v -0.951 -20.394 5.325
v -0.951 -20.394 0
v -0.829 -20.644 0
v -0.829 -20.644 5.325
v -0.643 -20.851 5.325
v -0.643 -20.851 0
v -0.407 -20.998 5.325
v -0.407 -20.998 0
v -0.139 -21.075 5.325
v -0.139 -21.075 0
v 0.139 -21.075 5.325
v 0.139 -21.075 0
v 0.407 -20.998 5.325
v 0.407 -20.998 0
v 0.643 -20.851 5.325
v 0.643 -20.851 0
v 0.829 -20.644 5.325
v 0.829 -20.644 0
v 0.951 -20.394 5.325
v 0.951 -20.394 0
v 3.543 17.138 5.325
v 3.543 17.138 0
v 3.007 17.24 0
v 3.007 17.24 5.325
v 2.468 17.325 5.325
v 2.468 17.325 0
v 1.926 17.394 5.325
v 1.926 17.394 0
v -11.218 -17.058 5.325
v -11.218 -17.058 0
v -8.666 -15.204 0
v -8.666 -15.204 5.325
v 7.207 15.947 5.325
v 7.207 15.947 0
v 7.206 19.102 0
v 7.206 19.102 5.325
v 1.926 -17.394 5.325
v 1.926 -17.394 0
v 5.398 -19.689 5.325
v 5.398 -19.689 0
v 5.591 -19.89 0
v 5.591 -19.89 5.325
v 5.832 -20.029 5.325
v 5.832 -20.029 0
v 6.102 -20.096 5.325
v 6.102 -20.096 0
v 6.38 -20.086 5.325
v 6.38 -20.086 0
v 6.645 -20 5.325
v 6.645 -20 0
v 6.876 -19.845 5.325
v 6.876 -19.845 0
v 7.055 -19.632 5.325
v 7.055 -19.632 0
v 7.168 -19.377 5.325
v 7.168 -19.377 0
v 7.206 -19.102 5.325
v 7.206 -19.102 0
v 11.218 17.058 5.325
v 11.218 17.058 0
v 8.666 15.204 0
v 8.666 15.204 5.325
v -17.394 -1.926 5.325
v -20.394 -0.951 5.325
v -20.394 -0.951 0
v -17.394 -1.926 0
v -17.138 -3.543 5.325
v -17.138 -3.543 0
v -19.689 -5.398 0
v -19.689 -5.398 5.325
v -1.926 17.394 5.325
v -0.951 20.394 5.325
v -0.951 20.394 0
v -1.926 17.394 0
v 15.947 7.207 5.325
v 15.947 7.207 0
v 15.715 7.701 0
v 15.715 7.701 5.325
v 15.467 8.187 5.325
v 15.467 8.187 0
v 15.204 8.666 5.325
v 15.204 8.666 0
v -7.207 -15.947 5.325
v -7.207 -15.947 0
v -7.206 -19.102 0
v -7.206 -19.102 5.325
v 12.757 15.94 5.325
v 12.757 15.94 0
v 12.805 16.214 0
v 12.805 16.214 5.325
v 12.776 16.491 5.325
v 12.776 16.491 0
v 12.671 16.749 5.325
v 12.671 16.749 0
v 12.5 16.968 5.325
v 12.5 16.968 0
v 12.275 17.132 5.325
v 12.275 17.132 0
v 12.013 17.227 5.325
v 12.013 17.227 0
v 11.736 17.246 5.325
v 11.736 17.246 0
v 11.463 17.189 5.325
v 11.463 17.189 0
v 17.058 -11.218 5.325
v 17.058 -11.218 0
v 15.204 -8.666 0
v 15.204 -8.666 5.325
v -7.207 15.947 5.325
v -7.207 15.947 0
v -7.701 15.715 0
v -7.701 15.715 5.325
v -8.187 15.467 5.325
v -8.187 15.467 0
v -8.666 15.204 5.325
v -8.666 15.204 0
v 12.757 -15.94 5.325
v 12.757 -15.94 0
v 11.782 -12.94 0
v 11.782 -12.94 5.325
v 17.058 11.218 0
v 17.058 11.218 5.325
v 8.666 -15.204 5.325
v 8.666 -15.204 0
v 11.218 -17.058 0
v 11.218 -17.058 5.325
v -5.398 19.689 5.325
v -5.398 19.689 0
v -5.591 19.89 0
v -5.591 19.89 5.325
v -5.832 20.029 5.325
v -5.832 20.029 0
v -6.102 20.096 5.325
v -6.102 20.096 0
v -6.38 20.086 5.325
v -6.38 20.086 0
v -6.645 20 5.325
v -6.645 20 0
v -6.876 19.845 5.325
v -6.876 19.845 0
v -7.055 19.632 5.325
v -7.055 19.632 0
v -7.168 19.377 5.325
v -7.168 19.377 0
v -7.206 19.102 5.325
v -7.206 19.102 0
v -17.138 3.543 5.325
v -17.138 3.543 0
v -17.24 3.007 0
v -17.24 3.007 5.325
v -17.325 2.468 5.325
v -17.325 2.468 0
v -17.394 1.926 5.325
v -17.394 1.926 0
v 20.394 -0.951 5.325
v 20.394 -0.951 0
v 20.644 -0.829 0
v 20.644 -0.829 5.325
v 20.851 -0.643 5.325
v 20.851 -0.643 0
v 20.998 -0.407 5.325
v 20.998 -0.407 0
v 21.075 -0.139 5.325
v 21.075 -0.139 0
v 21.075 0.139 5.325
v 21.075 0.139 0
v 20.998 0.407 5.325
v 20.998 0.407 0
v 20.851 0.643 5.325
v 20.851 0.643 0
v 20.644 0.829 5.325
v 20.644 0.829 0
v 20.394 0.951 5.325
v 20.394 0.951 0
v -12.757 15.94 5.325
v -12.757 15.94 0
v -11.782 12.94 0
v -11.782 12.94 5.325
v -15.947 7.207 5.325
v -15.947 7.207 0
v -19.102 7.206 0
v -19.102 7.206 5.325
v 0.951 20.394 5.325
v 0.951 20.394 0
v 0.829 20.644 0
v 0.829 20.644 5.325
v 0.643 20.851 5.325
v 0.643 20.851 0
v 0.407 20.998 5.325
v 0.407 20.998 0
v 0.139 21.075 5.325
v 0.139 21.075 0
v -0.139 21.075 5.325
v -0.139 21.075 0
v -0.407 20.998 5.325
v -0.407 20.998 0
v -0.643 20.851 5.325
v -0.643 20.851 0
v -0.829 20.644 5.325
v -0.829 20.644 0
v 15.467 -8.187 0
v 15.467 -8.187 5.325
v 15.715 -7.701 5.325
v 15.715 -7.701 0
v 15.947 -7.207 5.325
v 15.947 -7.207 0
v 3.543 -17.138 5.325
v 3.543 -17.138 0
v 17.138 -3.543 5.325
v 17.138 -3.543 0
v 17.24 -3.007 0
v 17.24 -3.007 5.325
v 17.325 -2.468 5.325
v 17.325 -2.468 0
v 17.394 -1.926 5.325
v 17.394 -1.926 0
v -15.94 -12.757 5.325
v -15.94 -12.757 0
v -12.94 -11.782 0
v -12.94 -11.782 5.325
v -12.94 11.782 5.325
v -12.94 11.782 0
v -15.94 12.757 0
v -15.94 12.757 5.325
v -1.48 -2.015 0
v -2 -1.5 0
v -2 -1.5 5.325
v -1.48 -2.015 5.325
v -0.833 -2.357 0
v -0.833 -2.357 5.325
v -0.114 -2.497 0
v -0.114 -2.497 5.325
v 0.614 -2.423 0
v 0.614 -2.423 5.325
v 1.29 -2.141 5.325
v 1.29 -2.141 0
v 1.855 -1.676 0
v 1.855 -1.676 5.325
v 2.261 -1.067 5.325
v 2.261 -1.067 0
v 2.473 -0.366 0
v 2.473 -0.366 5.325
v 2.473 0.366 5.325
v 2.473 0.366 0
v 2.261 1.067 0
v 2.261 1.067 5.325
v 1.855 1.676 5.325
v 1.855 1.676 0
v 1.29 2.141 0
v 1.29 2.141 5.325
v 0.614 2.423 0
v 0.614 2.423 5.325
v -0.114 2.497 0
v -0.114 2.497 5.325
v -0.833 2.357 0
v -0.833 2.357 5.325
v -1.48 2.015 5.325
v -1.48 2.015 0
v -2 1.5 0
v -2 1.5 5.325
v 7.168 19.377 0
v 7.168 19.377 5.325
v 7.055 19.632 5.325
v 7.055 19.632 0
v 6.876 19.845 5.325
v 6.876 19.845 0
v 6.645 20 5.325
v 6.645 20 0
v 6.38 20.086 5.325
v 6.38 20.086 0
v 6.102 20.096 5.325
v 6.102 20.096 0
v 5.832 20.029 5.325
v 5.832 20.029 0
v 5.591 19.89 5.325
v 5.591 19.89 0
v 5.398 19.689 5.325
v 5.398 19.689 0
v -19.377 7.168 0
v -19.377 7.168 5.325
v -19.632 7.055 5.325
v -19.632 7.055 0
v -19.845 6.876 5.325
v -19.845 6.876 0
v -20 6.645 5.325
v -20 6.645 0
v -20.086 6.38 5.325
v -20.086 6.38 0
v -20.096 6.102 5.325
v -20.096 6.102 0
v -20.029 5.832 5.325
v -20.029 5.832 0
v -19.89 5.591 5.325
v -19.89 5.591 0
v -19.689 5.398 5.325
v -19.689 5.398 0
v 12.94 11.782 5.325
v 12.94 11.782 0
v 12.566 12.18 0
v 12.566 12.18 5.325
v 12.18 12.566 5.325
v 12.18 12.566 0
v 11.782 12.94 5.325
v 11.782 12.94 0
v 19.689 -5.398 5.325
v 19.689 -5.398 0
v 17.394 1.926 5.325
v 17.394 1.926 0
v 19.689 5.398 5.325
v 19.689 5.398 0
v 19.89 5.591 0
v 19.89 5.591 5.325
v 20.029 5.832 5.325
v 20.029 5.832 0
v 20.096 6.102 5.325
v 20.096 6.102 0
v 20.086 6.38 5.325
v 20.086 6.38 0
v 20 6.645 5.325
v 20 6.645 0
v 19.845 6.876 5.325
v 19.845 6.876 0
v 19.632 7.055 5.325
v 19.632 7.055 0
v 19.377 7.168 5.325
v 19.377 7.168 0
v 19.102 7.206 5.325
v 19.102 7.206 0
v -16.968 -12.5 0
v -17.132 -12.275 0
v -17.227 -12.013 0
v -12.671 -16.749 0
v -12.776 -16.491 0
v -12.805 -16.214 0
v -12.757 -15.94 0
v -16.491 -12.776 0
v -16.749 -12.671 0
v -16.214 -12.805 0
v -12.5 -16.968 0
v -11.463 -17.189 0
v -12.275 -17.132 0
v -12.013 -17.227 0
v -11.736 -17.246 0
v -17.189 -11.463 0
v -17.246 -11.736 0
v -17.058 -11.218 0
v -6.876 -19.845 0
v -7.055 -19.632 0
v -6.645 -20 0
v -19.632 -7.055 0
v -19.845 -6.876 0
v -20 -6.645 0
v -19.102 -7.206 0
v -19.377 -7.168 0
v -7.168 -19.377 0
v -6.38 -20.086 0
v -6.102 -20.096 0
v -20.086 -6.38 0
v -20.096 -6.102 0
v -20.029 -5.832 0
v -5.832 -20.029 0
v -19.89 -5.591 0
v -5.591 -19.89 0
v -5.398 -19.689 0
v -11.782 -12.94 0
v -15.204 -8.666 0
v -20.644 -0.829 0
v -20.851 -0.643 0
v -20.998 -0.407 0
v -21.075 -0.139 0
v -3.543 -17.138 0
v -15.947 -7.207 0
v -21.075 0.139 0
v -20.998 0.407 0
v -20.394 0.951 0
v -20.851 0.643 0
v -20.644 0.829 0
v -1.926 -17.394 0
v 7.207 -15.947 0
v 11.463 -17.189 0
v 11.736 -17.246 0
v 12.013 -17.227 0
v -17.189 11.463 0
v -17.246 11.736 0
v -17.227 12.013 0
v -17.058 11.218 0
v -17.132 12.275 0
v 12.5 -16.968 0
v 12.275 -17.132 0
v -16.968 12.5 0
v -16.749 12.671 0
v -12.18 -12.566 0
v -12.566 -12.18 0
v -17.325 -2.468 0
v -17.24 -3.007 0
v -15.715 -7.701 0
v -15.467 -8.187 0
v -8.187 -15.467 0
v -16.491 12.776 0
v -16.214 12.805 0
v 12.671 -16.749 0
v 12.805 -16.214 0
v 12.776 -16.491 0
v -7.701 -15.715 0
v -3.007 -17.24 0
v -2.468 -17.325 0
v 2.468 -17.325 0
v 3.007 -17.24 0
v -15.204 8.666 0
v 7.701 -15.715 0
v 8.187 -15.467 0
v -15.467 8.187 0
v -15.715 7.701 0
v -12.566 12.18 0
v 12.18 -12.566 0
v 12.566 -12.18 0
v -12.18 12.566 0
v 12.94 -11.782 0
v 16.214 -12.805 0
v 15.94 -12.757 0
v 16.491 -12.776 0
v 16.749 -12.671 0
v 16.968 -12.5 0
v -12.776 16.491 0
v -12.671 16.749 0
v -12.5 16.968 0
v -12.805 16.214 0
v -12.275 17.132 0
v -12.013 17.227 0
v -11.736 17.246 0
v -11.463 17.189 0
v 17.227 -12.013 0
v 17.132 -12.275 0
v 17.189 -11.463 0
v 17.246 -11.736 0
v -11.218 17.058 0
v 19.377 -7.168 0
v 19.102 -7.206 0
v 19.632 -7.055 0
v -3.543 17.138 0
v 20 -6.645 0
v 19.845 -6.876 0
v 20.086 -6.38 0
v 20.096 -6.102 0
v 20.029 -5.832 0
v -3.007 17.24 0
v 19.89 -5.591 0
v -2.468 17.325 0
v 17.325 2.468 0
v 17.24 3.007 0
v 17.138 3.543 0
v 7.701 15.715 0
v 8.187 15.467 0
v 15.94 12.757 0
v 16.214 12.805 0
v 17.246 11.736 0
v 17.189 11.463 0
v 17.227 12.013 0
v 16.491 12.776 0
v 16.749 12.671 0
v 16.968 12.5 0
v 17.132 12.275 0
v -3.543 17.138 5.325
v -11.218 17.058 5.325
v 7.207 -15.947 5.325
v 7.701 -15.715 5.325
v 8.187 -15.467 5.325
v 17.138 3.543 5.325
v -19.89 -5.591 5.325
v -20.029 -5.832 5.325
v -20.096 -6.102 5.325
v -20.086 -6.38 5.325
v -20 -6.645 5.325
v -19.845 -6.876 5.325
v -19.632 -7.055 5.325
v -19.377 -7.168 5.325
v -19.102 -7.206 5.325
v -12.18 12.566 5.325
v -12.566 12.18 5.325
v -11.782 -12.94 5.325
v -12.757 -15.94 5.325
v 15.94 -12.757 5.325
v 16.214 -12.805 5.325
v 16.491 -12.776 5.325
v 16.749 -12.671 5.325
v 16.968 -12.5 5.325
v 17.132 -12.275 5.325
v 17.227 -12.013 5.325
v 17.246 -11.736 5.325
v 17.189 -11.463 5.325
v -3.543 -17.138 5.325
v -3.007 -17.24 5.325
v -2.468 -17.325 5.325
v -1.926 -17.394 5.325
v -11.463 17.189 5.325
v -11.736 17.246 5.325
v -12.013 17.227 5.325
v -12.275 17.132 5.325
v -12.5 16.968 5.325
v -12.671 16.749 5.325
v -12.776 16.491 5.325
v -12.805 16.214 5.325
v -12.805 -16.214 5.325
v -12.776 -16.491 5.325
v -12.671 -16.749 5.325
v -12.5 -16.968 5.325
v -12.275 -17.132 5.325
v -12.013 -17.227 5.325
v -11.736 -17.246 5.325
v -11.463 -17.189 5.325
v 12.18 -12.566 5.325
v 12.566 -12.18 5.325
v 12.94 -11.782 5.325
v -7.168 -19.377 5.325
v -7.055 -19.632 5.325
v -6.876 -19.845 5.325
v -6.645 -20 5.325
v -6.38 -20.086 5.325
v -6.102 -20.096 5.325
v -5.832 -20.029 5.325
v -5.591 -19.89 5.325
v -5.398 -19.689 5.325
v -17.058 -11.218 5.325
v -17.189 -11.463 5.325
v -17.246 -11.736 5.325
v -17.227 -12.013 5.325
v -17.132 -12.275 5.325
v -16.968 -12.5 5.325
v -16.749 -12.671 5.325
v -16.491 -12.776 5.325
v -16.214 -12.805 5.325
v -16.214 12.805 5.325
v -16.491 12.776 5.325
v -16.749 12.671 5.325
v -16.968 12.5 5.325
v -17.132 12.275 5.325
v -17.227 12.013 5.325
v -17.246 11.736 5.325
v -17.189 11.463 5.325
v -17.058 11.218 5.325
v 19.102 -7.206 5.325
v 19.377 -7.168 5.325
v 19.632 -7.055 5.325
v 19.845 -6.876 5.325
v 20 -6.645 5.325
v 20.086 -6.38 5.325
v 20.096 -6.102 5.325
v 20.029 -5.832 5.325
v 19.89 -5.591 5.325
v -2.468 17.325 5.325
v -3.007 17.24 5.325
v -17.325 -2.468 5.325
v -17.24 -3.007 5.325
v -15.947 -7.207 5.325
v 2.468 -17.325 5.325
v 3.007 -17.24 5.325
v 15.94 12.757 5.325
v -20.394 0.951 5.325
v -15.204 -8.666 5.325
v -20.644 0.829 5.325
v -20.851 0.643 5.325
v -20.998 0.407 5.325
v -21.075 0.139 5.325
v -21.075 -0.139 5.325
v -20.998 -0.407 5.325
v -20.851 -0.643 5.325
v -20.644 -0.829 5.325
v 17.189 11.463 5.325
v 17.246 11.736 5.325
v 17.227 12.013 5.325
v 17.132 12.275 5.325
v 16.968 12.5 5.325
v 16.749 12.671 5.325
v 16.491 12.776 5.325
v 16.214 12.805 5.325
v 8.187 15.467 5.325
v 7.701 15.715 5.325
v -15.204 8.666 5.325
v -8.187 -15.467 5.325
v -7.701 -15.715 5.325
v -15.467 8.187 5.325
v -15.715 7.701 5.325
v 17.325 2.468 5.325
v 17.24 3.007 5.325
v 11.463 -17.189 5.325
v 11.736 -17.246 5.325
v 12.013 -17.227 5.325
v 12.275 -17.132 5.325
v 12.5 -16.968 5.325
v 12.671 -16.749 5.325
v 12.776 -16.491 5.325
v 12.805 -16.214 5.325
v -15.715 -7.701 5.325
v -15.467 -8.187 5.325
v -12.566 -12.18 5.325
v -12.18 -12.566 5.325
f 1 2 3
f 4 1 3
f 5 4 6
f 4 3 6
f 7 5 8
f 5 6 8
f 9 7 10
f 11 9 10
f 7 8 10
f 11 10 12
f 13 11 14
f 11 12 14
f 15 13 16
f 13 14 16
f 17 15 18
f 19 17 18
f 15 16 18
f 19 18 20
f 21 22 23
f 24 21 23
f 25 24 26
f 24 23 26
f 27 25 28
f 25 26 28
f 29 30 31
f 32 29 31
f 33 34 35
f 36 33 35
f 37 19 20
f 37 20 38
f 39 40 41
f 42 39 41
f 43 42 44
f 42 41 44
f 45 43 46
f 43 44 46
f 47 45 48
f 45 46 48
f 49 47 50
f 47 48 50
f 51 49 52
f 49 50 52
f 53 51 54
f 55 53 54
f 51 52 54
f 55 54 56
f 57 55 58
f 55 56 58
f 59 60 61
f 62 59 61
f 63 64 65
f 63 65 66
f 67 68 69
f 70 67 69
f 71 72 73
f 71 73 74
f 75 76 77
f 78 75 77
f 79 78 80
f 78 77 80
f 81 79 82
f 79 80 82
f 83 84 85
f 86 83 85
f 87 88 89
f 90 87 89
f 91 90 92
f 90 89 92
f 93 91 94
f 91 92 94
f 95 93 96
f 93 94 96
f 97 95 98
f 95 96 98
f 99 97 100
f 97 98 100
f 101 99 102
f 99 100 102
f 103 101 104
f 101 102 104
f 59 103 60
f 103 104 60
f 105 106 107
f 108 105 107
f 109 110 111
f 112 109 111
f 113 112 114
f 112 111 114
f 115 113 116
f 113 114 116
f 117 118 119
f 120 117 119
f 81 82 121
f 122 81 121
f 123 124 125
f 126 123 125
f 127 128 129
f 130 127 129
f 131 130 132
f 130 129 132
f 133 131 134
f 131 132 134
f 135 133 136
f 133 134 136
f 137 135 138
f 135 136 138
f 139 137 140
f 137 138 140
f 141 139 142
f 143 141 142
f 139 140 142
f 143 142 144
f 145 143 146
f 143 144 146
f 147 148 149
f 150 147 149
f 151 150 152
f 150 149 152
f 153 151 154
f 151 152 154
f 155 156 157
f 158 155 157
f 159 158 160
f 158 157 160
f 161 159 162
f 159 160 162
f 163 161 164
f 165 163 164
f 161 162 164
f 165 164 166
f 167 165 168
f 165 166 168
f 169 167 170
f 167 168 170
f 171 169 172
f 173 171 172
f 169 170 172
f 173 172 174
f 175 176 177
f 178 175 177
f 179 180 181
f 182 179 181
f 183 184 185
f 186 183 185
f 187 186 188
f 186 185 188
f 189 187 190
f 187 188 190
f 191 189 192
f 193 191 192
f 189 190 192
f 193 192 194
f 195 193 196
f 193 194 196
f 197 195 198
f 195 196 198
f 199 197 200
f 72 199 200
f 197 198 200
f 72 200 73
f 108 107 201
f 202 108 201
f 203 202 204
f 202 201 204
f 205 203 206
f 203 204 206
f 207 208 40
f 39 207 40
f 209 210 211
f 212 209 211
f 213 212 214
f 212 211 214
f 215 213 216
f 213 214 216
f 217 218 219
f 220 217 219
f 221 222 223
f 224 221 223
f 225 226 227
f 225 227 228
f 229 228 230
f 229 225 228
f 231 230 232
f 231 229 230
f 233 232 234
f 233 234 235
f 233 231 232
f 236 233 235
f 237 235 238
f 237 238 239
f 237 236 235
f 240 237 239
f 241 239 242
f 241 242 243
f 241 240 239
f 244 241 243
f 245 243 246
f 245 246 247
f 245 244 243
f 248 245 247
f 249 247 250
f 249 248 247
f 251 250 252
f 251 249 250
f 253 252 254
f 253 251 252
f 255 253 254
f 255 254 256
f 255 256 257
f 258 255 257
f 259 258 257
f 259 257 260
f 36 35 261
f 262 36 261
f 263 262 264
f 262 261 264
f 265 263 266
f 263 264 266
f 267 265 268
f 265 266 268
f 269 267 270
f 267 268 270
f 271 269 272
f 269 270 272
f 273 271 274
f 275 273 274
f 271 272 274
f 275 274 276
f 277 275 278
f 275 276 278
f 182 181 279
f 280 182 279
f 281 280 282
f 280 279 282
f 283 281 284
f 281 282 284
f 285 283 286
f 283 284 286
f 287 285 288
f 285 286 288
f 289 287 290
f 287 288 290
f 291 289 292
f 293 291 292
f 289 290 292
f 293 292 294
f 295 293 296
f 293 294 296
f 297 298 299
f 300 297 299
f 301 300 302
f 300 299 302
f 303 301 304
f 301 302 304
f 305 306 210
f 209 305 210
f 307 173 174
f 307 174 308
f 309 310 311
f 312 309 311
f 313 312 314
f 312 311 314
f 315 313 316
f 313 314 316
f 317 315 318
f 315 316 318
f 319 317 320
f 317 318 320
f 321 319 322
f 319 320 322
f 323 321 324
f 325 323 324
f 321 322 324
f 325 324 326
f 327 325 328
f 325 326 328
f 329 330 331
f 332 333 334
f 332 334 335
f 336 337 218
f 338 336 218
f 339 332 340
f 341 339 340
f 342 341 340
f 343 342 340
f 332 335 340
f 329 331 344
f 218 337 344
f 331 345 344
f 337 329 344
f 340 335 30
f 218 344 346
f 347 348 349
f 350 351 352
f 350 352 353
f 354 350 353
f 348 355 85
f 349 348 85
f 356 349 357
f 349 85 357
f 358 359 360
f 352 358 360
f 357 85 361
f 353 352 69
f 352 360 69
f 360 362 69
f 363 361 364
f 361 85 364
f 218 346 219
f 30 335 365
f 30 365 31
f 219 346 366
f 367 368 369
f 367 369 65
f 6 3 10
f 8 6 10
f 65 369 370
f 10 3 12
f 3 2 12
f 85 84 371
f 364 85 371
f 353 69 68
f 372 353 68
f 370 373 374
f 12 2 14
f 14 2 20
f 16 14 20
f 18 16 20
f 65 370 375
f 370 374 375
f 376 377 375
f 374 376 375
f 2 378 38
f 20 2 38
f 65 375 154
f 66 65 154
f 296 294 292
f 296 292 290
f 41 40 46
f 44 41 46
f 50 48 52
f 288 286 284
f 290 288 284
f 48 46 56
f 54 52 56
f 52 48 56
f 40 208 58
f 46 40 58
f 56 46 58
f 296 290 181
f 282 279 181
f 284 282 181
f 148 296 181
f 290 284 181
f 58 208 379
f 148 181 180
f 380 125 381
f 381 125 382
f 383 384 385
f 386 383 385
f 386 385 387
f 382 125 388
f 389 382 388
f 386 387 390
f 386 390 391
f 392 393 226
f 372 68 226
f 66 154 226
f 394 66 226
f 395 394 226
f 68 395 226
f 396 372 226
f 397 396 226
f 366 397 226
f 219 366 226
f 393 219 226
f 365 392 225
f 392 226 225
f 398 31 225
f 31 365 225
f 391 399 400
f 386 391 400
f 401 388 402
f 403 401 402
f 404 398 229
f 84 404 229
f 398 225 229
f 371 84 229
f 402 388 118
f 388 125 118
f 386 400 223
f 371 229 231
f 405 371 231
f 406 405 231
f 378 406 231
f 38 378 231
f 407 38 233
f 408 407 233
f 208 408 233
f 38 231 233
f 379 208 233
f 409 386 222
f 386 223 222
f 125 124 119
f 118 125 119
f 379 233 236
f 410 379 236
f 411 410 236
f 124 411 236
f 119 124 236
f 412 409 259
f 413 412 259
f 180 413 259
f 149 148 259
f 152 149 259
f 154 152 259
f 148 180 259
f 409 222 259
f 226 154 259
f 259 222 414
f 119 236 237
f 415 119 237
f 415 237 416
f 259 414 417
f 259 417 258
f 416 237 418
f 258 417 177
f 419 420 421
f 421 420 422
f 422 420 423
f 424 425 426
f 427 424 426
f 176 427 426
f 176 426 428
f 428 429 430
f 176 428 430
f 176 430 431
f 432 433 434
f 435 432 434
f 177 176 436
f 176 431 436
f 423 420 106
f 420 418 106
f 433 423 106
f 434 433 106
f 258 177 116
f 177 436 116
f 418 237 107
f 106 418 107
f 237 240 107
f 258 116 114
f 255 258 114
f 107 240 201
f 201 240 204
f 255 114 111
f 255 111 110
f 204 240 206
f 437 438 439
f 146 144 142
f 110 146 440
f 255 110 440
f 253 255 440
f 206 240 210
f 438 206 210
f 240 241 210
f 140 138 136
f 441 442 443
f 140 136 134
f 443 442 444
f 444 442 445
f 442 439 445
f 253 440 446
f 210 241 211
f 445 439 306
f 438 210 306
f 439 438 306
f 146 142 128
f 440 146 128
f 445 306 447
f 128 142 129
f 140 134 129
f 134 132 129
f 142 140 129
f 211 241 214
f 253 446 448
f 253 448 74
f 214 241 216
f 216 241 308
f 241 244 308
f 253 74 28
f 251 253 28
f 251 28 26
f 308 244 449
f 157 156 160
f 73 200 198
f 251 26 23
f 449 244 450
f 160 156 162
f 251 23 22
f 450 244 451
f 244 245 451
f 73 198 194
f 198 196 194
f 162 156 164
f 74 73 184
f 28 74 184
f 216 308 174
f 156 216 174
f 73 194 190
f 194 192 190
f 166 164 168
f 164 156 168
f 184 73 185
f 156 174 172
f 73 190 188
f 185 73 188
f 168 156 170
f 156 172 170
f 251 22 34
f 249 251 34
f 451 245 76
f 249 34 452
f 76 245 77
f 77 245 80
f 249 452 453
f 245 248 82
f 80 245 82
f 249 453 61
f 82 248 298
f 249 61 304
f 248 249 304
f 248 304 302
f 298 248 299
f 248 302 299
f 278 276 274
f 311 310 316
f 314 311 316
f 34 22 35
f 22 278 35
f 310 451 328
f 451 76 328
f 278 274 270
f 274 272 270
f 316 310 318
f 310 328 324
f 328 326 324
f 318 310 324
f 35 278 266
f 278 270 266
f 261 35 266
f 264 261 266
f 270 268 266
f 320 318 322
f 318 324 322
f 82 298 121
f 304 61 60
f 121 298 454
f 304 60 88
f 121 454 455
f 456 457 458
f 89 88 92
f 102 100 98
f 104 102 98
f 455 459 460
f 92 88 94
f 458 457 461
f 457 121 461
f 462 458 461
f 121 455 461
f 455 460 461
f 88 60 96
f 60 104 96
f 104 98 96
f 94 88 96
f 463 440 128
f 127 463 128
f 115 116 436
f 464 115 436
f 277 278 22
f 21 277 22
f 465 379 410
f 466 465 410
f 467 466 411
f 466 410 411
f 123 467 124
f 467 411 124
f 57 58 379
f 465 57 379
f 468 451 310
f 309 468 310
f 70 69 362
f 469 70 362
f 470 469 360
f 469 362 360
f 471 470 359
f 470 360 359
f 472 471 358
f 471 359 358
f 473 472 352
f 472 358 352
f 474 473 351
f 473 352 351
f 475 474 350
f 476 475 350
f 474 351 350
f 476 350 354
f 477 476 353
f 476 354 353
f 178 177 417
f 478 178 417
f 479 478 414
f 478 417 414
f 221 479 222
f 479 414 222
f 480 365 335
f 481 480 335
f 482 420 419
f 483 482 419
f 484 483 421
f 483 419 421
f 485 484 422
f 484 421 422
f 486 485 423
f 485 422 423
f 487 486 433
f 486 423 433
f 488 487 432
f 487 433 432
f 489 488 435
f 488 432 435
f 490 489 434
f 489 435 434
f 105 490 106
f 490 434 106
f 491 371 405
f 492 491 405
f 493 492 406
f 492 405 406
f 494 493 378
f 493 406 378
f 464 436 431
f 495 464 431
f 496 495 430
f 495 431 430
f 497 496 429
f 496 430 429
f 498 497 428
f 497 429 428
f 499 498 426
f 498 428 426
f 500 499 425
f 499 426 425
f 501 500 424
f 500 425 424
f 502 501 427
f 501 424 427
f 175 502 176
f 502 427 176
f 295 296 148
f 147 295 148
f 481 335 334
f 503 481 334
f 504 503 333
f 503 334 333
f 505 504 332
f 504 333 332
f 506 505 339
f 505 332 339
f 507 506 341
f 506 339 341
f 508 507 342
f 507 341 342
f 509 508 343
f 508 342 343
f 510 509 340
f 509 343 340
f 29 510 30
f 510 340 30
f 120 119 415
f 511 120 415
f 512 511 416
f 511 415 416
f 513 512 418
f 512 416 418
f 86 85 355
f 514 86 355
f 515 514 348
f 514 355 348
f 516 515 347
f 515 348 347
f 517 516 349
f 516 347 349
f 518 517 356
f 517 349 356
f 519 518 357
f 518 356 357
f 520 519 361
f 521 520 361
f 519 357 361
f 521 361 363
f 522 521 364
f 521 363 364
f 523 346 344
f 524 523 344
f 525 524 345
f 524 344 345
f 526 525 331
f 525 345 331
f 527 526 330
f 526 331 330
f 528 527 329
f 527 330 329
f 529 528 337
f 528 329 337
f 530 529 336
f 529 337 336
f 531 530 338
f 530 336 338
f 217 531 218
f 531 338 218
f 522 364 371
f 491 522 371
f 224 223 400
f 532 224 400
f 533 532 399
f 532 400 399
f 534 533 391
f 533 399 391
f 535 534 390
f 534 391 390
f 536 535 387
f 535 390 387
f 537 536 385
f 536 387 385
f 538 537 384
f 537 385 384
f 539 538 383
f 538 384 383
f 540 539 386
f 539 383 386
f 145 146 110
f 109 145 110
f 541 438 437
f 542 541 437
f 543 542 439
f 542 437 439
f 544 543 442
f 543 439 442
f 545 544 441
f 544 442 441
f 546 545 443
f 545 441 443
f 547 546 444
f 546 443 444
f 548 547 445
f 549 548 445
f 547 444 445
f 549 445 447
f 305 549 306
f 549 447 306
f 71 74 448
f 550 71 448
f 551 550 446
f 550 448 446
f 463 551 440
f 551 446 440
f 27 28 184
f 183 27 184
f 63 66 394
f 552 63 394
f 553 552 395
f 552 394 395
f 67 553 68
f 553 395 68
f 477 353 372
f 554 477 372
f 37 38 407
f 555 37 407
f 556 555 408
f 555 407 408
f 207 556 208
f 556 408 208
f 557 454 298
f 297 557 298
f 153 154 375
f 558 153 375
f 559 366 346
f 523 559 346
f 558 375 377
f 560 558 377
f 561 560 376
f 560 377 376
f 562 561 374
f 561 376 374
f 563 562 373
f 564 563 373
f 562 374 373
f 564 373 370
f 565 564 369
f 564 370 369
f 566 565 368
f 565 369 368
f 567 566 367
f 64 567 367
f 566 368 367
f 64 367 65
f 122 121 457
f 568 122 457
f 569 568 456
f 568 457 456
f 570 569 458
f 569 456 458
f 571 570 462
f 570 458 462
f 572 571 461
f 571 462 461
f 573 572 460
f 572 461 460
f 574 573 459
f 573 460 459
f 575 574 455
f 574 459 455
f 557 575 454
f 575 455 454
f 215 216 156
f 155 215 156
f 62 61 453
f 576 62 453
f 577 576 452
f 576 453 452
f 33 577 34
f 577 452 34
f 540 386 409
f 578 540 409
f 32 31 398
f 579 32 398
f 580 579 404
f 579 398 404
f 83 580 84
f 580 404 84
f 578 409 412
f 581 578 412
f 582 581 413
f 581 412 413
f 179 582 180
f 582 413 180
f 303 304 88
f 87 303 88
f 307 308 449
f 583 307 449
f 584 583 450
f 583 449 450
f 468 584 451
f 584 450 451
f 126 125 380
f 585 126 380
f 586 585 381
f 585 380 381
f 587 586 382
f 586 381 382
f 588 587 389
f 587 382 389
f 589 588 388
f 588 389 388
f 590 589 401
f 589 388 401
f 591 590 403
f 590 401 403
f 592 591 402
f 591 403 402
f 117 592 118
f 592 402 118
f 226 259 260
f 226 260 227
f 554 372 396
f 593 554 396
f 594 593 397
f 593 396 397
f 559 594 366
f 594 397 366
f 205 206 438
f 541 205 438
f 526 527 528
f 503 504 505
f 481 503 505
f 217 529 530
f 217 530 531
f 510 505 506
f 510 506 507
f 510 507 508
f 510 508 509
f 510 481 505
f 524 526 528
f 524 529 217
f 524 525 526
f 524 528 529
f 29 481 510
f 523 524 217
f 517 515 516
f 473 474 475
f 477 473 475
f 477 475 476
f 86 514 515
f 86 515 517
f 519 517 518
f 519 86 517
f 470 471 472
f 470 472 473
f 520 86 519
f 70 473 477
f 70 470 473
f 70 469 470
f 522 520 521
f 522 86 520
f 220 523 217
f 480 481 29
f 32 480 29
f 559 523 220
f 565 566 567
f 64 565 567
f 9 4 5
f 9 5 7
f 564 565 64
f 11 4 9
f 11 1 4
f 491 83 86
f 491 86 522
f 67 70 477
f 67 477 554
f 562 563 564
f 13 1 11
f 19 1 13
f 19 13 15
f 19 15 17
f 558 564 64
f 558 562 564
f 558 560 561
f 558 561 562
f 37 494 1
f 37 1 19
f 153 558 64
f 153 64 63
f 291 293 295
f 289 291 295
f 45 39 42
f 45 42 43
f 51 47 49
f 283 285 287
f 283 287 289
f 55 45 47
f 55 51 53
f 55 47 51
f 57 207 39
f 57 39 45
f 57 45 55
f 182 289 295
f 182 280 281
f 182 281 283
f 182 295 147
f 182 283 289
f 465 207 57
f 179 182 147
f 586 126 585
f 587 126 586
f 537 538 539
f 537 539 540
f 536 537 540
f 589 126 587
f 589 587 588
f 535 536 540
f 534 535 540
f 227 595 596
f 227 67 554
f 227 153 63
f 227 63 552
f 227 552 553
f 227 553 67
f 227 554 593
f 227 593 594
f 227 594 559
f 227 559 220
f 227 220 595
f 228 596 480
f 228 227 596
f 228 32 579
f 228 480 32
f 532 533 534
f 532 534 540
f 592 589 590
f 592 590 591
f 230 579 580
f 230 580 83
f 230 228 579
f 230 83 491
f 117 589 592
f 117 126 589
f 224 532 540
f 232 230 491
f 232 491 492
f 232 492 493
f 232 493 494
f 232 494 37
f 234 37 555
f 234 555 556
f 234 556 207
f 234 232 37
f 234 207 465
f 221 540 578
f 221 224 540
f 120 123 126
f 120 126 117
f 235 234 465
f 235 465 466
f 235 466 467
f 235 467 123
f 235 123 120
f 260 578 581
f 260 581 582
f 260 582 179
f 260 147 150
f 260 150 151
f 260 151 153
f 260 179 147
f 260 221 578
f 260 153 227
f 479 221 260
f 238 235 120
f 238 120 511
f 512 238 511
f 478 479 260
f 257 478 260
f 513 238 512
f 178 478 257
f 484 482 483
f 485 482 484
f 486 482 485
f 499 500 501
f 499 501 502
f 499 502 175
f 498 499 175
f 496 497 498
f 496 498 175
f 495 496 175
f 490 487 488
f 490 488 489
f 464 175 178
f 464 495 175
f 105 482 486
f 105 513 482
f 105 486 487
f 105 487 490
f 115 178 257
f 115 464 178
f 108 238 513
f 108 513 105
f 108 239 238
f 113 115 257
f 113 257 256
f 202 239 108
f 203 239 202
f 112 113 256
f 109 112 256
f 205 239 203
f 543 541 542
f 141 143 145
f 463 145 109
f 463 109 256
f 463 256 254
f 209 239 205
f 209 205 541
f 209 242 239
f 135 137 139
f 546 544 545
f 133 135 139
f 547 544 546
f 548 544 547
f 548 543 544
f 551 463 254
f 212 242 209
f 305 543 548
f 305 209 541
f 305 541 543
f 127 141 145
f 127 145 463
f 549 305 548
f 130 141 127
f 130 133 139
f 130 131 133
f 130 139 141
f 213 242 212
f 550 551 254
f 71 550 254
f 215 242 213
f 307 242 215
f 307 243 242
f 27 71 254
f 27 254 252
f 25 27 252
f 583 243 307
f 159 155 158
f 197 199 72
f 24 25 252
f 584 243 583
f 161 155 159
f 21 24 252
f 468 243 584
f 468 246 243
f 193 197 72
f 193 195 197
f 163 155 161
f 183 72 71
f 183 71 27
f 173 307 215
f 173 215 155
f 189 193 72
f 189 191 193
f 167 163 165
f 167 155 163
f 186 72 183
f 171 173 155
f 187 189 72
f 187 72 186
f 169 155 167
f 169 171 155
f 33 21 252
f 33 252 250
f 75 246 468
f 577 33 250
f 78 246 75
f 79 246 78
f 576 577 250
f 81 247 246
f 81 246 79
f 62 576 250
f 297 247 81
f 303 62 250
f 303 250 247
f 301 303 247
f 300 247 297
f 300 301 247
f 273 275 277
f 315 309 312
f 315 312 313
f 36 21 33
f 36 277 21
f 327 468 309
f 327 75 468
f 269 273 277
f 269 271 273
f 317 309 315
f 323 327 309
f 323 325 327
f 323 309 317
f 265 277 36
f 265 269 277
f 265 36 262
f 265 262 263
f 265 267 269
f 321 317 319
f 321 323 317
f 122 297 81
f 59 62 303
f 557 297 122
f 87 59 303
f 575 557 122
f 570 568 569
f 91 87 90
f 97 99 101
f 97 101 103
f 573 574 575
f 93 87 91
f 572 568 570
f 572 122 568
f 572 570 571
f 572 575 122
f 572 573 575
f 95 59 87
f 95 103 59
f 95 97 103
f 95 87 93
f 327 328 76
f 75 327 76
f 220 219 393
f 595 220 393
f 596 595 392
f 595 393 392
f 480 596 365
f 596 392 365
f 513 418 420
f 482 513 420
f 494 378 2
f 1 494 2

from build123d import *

# Parameters (mm, degrees)
DODANIE_WYCI_GNI_CIE1_DEPTH = 5.325088567


with BuildPart() as part:
    # Szkic1 → Dodanie-wyciągnięcie1 (new body)
    with BuildSketch(Plane.XY):
        with BuildLine():
            Line((-0.951045555, 20.39370068), (-1.925922284, 17.39370068))
            ThreePointArc((-1.925922284, 17.39370068), (-2.737603138, 17.28454596), (-3.543288168, 17.13753509))
            Line((-3.543288168, 17.13753509), (-5.397502016, 19.689451162))
            ThreePointArc((-5.397502016, 19.689451162), (-6.515515156, 20.052693732), (-7.206498161, 19.101672684))
            Line((-7.206498161, 19.101672684), (-7.206610043, 15.947249659))
            ThreePointArc((-7.206610043, 15.947249659), (-7.944833745, 15.592614173), (-8.665656885, 15.203828161))
            Line((-8.665656885, 15.203828161), (-11.217704483, 17.05786098))
            ThreePointArc((-11.217704483, 17.05786098), (-12.393246293, 17.057840133), (-12.756528516, 15.939839877))
            Line((-12.756528516, 15.939839877), (-11.7818646, 12.93977073))
            ThreePointArc((-11.7818646, 12.93977073), (-12.374368671, 12.374368671), (-12.93977073, 11.7818646))
            Line((-12.93977073, 11.7818646), (-15.939839877, 12.756528516))
            ThreePointArc((-15.939839877, 12.756528516), (-17.057840133, 12.393246293), (-17.05786098, 11.217704483))
            Line((-17.05786098, 11.217704483), (-15.203828161, 8.665656885))
            ThreePointArc((-15.203828161, 8.665656885), (-15.592614173, 7.944833745), (-15.947249659, 7.206610043))
            Line((-15.947249659, 7.206610043), (-19.101672684, 7.206498161))
            ThreePointArc((-19.101672684, 7.206498161), (-20.052693732, 6.515515156), (-19.689451162, 5.397502016))
            Line((-19.689451162, 5.397502016), (-17.13753509, 3.543288168))
            ThreePointArc((-17.13753509, 3.543288168), (-17.28454596, 2.737603138), (-17.39370068, 1.925922284))
            Line((-17.39370068, 1.925922284), (-20.39370068, 0.951045555))
            ThreePointArc((-20.39370068, 0.951045555), (-21.084649954, 0), (-20.39370068, -0.951045555))
            Line((-20.39370068, -0.951045555), (-17.39370068, -1.925922284))
            ThreePointArc((-17.39370068, -1.925922284), (-17.28454596, -2.737603138), (-17.13753509, -3.543288168))
            Line((-17.13753509, -3.543288168), (-19.689451162, -5.397502016))
            ThreePointArc((-19.689451162, -5.397502016), (-20.052693732, -6.515515156), (-19.101672684, -7.206498161))
            Line((-19.101672684, -7.206498161), (-15.947249659, -7.206610043))
            ThreePointArc((-15.947249659, -7.206610043), (-15.592614173, -7.944833745), (-15.203828161, -8.665656885))
            Line((-15.203828161, -8.665656885), (-17.05786098, -11.217704483))
            ThreePointArc((-17.05786098, -11.217704483), (-17.057840133, -12.393246293), (-15.939839877, -12.756528516))
            Line((-15.939839877, -12.756528516), (-12.93977073, -11.7818646))
            ThreePointArc((-12.93977073, -11.7818646), (-12.374368671, -12.374368671), (-11.7818646, -12.93977073))
            Line((-11.7818646, -12.93977073), (-12.756528516, -15.939839877))
            ThreePointArc((-12.756528516, -15.939839877), (-12.393246293, -17.057840133), (-11.217704483, -17.05786098))
            Line((-11.217704483, -17.05786098), (-8.665656885, -15.203828161))
            ThreePointArc((-8.665656885, -15.203828161), (-7.944833745, -15.592614173), (-7.206610043, -15.947249659))
            Line((-7.206610043, -15.947249659), (-7.206498161, -19.101672684))
            ThreePointArc((-7.206498161, -19.101672684), (-6.515515156, -20.052693732), (-5.397502016, -19.689451162))
            Line((-5.397502016, -19.689451162), (-3.543288168, -17.13753509))
            ThreePointArc((-3.543288168, -17.13753509), (-2.737603138, -17.28454596), (-1.925922284, -17.39370068))
            Line((-1.925922284, -17.39370068), (-0.951045555, -20.39370068))
            ThreePointArc((-0.951045555, -20.39370068), (0, -21.084649954), (0.951045555, -20.39370068))
            Line((0.951045555, -20.39370068), (1.925922284, -17.39370068))
            ThreePointArc((1.925922284, -17.39370068), (2.737603138, -17.28454596), (3.543288168, -17.13753509))
            Line((3.543288168, -17.13753509), (5.397502016, -19.689451162))
            ThreePointArc((5.397502016, -19.689451162), (6.515515156, -20.052693732), (7.206498161, -19.101672684))
            Line((7.206498161, -19.101672684), (7.206610043, -15.947249659))
            ThreePointArc((7.206610043, -15.947249659), (7.944833745, -15.592614173), (8.665656885, -15.203828161))
            Line((8.665656885, -15.203828161), (11.217704483, -17.05786098))
            ThreePointArc((11.217704483, -17.05786098), (12.393246293, -17.057840133), (12.756528516, -15.939839877))
            Line((12.756528516, -15.939839877), (11.7818646, -12.93977073))
            ThreePointArc((11.7818646, -12.93977073), (12.374368671, -12.374368671), (12.93977073, -11.7818646))
            Line((12.93977073, -11.7818646), (15.939839877, -12.756528516))
            ThreePointArc((15.939839877, -12.756528516), (17.057840133, -12.393246293), (17.05786098, -11.217704483))
            Line((17.05786098, -11.217704483), (15.203828161, -8.665656885))
            ThreePointArc((15.203828161, -8.665656885), (15.592614173, -7.944833745), (15.947249659, -7.206610043))
            Line((15.947249659, -7.206610043), (19.101672684, -7.206498161))
            ThreePointArc((19.101672684, -7.206498161), (20.052693732, -6.515515156), (19.689451162, -5.397502016))
            Line((19.689451162, -5.397502016), (17.13753509, -3.543288168))
            ThreePointArc((17.13753509, -3.543288168), (17.28454596, -2.737603138), (17.39370068, -1.925922284))
            Line((17.39370068, -1.925922284), (20.39370068, -0.951045555))
            ThreePointArc((20.39370068, -0.951045555), (21.084649954, 0), (20.39370068, 0.951045555))
            Line((20.39370068, 0.951045555), (17.39370068, 1.925922284))
            ThreePointArc((17.39370068, 1.925922284), (17.28454596, 2.737603138), (17.13753509, 3.543288168))
            Line((17.13753509, 3.543288168), (19.689451162, 5.397502016))
            ThreePointArc((19.689451162, 5.397502016), (20.052693732, 6.515515156), (19.101672684, 7.206498161))
            Line((19.101672684, 7.206498161), (15.947249659, 7.206610043))
            ThreePointArc((15.947249659, 7.206610043), (15.592614173, 7.944833745), (15.203828161, 8.665656885))
            Line((15.203828161, 8.665656885), (17.05786098, 11.217704483))
            ThreePointArc((17.05786098, 11.217704483), (17.057840133, 12.393246293), (15.939839877, 12.756528516))
            Line((15.939839877, 12.756528516), (12.93977073, 11.7818646))
            ThreePointArc((12.93977073, 11.7818646), (12.374368671, 12.374368671), (11.7818646, 12.93977073))
            Line((11.7818646, 12.93977073), (12.756528516, 15.939839877))
            ThreePointArc((12.756528516, 15.939839877), (12.393246293, 17.057840133), (11.217704483, 17.05786098))
            Line((11.217704483, 17.05786098), (8.665656885, 15.203828161))
            ThreePointArc((8.665656885, 15.203828161), (7.944833745, 15.592614173), (7.206610043, 15.947249659))
            Line((7.206610043, 15.947249659), (7.206498161, 19.101672684))
            ThreePointArc((7.206498161, 19.101672684), (6.515515156, 20.052693732), (5.397502016, 19.689451162))
            Line((5.397502016, 19.689451162), (3.543288168, 17.13753509))
            ThreePointArc((3.543288168, 17.13753509), (2.737603138, 17.28454596), (1.925922284, 17.39370068))
            Line((1.925922284, 17.39370068), (0.951045555, 20.39370068))
            ThreePointArc((0.951045555, 20.39370068), (0, 21.084649954), (-0.951045555, 20.39370068))
        make_face()
        with BuildLine():
            Line((-2, 1.5), (-2, -1.5))
            ThreePointArc((-2, -1.5), (2.5, 0), (-2, 1.5))
        make_face(mode=Mode.SUBTRACT)
    extrude(amount=DODANIE_WYCI_GNI_CIE1_DEPTH)


solid = part.part
